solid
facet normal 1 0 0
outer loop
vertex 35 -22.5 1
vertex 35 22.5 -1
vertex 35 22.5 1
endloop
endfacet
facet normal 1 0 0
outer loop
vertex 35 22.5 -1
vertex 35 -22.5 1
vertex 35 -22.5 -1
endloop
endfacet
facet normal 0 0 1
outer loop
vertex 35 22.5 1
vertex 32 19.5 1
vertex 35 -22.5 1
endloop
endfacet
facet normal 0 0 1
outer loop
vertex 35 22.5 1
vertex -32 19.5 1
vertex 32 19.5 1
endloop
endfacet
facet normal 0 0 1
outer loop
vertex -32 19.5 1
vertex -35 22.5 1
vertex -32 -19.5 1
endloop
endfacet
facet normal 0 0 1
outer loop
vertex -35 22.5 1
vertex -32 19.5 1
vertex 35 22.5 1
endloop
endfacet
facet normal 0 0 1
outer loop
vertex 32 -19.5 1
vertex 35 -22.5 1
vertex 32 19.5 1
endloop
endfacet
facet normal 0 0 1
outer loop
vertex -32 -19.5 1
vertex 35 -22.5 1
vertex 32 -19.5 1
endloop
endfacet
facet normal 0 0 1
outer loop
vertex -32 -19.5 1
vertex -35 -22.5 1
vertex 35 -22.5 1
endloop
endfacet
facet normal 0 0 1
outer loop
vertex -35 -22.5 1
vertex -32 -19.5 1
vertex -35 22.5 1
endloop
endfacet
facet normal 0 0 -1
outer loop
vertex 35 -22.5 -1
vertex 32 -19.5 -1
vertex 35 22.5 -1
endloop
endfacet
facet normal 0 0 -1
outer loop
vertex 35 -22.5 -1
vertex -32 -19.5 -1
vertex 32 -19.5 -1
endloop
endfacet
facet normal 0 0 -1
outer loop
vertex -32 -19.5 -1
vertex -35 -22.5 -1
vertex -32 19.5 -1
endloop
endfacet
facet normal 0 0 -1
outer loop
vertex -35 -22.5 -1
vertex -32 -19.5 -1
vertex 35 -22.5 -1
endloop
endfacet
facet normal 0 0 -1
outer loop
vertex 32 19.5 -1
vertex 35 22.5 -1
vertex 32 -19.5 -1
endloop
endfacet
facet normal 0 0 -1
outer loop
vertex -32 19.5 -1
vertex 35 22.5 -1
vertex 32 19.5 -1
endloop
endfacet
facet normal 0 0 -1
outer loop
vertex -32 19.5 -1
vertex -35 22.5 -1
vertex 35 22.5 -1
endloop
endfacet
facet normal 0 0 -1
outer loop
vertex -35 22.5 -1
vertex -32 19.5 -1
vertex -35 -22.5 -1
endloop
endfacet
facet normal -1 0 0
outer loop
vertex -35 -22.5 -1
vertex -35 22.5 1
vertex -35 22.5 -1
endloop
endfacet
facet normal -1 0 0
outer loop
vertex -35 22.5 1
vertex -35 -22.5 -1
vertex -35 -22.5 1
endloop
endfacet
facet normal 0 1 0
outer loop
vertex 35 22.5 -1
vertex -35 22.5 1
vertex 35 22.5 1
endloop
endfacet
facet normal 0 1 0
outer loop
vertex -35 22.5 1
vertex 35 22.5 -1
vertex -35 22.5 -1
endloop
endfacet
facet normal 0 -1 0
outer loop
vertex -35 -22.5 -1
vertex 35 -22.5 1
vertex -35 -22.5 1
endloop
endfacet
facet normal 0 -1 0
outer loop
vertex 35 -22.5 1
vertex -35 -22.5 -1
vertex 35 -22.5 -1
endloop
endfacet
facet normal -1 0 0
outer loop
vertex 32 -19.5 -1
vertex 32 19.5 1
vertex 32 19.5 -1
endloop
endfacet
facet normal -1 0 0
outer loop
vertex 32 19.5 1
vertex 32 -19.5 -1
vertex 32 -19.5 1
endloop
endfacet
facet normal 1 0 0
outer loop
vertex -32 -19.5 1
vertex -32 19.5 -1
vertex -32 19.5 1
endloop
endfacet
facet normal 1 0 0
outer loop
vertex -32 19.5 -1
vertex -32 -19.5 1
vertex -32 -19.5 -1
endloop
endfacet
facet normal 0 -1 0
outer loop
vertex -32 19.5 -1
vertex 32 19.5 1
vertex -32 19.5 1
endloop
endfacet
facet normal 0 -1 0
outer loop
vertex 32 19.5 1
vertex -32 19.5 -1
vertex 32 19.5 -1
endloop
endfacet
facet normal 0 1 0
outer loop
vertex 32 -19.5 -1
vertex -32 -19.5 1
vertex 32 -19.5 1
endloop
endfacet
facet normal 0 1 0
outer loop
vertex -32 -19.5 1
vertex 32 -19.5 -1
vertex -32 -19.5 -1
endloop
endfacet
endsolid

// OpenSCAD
// file: controller.scad
w_back = 70;
h_back = 45;
w_controller = 20;
thickness_bottom = 2;

h_walls = 4;
thickness_walls = 2;
gap_backlight = 1.5;

kit_controller();
//walls();

// debug_controller();

module debug_controller() {
    difference() {
        kit_controller();
        translate([-w_controller/2, 0, h_walls/2])
        cube([w_controller, h_back+2*thickness_walls+gap_backlight+1, 2*h_walls], center=true);
    }
}

module kit_controller() {
    controller();
    translate([0, 0, h_walls/2])
    walls();
}

module walls() {
    difference() {
        cube([w_controller+2*thickness_walls+gap_backlight, h_back+2*thickness_walls+gap_backlight, thickness_bottom+h_walls], center=true);
        color("red")
        cube([w_controller+gap_backlight, h_back+gap_backlight, thickness_bottom+h_walls+1], center=true);
        translate([-w_controller-thickness_walls+gap_backlight/2-0.25, 0, 0])
        cube([w_controller+gap_backlight, h_back+gap_backlight+2*+thickness_walls + 1, thickness_bottom+h_walls+1], center=true);
    }
}

module controller() {
    cube([w_controller+gap_backlight, h_back+gap_backlight, thickness_bottom], center=true);
}
// file: akkum18650.scad
echo("Работа Арина Иванова");
d_akkum=18;
h_akkum=65;

twoAcc();

module twoAcc() {
translate([0, -d_akkum/2-1, d_akkum/2+1])
rotate([0, 90, 0])
akkum18650();
    
translate([0, d_akkum/2+1, d_akkum/2+1])
rotate([0, 90, 0])
akkum18650();
    
translate([-33, -10, 0])
import("flexbatter18650x2.stl");
}

module akkum18650() {
color("violet")
cylinder(d=d_akkum, h=h_akkum, $fn=32, center=true);
}
// main file
use <akkum18650.scad>
use <controller.scad>

echo("Работа Арина Иванова");
d_akkum=18;
h_akkum=65;
d_wires=1.2;

thickness_frame = 4;
thickness_walls = 2;
thickness_bottom = 2;
thickness_top = 2;
widht_frame_window = 3;

w_back = 70;
h_back = 45;
thickness_back = 1;
h_walls = 4;
gap_backlight = 1.5;
w_controller = 20;

//kit_frame();
//translate([w_back/2+w_controller/2+2*thickness_walls-0.51, 0, 0,])
//kit_controller();

//translate([1, 0, 0])
//debug_controller(); 
//frame_debug(); 
//translate([0, 0, thickness_bottom/2+thickness_top/2])
window_frame();
//walls();

module window_frame(){
difference() {
    color("green")
    cube([w_back, h_back, thickness_top], center=true);
    color("red")
    cube([w_back-2*widht_frame_window, h_back-2*widht_frame_window, thickness_top+1], center=true);
 }
}

module frame_debug() {
difference() {
    kit_frame();
    translate([w_back/2, 0, h_walls-thickness_bottom])
    cube([w_back, h_back+2*thickness_walls+2, 2*h_walls], center=true);
 }
}
    
module kit_frame(){
    bottom();
    //color("green")
    translate([0,0,h_walls/2+thickness_bottom/2])
    walls();
    wires();
    translate([0, 0, thickness_bottom/2+thickness_top/2])
    window_frame();
}

module wires() {
    translate([w_back/2, -h_back/2+6, h_walls/2+0.5])
    rotate([0, 90, 0])
    color("red")
    cylinder(d=d_wires, h=25, center=true, $fn=25);
    
    translate([w_back/2, -h_back/2+2, h_walls/2+0.5])
    rotate([0, 90, 0])
    color("black")
    cylinder(d=d_wires, h=25, center=true, $fn=25);
}

module walls(){
    difference(){
        cube([w_back+2*thickness_walls+gap_backlight, h_back+2*thickness_walls+gap_backlight, h_walls], center = true);
        color("red")
        cube([w_back+gap_backlight, h_back+gap_backlight, h_walls+1], center = true);
    }
}
module backlight(){
    color("lightgreen")
    cube([w_back, h_back, thickness_back], center = true);
}

module bottom(){
    cube([w_back+2*thickness_walls+gap_backlight, h_back+2*thickness_walls+gap_backlight, thickness_bottom], center = true);
}
